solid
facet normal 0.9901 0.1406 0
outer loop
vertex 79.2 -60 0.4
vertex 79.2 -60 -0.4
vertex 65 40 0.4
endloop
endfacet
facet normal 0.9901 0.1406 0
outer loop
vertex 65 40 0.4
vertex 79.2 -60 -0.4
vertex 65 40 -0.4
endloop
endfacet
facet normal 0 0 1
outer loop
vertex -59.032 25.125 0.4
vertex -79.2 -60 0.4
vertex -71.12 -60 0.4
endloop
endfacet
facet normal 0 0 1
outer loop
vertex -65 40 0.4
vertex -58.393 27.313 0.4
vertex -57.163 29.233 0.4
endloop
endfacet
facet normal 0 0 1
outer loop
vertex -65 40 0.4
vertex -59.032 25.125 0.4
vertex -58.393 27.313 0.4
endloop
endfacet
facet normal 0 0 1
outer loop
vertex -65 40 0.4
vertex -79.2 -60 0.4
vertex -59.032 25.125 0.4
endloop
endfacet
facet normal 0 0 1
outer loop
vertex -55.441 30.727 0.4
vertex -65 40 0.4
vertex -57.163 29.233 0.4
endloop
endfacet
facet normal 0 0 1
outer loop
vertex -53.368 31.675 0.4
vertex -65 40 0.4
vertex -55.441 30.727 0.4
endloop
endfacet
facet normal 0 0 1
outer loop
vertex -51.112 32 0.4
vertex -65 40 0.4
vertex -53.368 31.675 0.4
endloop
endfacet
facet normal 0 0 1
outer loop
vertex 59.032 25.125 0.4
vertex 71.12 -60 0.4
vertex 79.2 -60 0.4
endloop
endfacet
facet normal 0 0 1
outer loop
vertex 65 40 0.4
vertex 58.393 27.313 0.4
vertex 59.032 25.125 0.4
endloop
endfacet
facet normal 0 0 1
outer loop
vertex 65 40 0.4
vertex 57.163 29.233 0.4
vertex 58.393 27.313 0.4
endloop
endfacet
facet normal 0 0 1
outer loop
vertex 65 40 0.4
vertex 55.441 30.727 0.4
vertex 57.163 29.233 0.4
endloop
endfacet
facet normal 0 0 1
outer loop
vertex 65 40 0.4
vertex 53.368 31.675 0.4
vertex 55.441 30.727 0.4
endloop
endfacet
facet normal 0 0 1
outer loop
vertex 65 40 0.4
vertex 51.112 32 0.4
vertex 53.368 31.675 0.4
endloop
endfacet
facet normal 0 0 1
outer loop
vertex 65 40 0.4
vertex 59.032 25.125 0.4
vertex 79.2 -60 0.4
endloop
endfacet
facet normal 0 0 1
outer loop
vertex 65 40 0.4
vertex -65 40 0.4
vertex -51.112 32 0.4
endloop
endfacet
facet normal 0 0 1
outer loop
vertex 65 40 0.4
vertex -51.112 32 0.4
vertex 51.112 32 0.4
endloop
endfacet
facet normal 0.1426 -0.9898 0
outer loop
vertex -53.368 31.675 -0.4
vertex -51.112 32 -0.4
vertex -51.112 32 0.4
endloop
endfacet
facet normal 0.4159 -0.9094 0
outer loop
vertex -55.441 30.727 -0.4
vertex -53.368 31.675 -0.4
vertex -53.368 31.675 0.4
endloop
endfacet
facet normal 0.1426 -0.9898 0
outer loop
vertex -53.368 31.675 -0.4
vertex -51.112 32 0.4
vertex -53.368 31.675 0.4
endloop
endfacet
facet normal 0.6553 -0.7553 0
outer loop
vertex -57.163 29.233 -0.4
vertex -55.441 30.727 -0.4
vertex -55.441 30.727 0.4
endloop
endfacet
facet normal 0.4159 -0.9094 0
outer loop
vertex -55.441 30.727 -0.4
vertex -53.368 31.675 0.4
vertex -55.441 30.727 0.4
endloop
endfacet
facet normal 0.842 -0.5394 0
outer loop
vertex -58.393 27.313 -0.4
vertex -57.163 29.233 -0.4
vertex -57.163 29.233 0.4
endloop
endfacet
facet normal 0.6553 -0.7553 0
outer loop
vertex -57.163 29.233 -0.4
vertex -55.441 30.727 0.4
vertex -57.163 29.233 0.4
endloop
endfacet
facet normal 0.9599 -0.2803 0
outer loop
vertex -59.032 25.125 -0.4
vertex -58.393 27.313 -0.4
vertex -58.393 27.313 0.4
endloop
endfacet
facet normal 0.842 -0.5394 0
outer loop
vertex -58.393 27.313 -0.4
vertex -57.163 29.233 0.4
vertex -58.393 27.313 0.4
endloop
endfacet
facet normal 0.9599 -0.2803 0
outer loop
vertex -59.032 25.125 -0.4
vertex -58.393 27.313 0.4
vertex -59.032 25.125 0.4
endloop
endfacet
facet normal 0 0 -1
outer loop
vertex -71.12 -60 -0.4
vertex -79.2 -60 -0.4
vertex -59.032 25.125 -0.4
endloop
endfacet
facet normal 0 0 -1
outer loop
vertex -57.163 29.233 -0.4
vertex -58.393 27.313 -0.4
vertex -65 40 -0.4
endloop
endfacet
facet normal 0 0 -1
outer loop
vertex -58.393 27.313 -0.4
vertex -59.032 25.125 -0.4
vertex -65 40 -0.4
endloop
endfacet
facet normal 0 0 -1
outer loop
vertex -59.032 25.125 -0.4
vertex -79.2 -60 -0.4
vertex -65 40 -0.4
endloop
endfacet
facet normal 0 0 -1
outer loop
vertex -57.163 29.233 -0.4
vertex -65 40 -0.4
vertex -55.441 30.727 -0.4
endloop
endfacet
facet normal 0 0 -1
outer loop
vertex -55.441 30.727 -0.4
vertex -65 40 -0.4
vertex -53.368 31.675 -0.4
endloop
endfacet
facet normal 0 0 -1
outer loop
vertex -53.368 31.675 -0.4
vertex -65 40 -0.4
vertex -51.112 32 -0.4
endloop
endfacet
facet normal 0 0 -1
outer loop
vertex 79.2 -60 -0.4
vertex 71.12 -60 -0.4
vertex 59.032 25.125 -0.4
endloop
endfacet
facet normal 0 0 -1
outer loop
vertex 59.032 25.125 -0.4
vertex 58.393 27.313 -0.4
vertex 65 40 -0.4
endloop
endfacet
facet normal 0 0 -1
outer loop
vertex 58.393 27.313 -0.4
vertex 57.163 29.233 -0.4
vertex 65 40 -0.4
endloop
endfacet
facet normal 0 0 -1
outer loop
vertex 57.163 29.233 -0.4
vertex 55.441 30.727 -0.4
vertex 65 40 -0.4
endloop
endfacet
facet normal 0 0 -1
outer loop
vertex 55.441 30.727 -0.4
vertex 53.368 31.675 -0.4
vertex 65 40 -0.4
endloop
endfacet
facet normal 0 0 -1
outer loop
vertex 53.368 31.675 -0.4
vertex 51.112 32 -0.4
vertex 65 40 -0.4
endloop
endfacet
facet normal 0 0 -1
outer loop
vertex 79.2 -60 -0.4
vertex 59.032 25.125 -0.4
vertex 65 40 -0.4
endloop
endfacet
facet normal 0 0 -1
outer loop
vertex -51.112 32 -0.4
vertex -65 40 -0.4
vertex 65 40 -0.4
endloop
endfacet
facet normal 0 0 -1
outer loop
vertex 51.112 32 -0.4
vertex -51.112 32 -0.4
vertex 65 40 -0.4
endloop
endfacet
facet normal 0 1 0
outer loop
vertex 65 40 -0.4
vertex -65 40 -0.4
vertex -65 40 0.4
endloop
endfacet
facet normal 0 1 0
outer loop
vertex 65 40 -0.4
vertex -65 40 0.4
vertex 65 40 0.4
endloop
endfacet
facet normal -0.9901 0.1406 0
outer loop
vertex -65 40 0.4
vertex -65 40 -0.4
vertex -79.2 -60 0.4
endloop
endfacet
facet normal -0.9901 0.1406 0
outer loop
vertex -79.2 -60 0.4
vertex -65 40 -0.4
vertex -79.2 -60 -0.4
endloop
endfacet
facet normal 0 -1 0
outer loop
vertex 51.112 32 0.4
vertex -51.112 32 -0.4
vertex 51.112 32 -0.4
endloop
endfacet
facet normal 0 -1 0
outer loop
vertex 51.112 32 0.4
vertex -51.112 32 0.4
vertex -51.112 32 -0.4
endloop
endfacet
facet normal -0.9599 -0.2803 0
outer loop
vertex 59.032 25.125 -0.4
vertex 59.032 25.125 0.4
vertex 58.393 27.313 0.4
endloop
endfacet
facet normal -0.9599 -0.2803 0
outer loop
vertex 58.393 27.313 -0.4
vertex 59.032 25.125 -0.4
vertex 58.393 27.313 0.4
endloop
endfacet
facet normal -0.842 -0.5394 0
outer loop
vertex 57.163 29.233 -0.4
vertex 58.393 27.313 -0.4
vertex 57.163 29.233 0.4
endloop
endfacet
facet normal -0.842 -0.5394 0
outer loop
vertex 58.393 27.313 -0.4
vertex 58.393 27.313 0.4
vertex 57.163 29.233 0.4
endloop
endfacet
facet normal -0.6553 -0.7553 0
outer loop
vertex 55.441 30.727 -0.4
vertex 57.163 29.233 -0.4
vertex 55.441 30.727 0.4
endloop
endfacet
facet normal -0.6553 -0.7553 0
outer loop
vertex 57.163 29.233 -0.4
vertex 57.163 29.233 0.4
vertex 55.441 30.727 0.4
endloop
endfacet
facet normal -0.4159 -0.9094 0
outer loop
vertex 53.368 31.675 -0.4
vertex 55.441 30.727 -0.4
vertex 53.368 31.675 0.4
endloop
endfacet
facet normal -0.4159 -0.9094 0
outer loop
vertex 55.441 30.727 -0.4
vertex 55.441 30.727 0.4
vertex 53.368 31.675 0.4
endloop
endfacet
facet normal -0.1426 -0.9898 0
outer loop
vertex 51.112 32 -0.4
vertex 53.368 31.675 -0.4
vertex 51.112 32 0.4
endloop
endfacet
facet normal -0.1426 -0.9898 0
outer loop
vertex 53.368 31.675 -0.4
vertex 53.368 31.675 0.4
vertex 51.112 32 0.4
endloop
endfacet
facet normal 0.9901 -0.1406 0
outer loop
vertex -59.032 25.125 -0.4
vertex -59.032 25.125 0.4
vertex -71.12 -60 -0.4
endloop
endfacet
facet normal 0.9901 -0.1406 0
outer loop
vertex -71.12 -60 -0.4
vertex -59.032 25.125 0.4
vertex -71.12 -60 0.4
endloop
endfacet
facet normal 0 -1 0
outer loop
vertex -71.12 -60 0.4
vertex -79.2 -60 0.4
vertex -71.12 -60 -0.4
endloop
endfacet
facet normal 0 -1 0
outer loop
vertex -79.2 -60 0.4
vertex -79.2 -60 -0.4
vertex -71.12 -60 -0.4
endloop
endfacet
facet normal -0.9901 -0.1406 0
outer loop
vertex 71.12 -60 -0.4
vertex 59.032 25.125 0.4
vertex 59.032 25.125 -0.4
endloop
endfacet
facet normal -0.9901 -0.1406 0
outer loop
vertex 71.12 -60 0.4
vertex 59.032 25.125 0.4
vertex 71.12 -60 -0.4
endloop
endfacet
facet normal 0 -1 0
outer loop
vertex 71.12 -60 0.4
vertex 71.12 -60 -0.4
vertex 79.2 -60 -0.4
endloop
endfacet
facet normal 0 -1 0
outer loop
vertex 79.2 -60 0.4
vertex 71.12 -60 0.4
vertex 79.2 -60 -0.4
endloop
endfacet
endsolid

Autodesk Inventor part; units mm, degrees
ref_plane "YZ Plane" through (0, 0, 0) normal (1, 0, 0) x (0, 1, 0)
ref_plane "XZ Plane" through (0, 0, 0) normal (0, 1, 0) x (-1, 0, 0)
ref_plane "XY Plane" through (0, 0, 0) normal (0, 0, 1) x (1, 0, 0)
sketch "Sketch1" plane through (0, 0, 0) normal (0, 0, 1) x (1, 0, 0)
  line L0 (0, 60) -> (0, -80) construction
  line L1 (-110.88, 0) -> (110.88, 0) construction
  line L2 (-79.2, -60) -> (79.2, -60)
  line L3 (79.2, -60) -> (65, 40)
  line L4 (-65, 40) -> (65, 40)
  line L5 (-65, 40) -> (-79.2, -60)
  point P0 (0, 0)
  dimension "d0" = 158.4
  dimension "d9" = 130
  dimension "d10" = 60
  dimension "d11" = 100
extrude "Extrusion1" add sketch "Sketch1" along normal mid plane 0.8
sketch "Esquisse2" plane through (0, 0, 0.4) normal (0, 0, 1) x (1, 0, 0)
  line L0 (-79.2, -60) -> (79.2, -60) construction
  line L1 (79.2, -60) -> (65, 40) construction
  line L2 (65, 40) -> (-65, 40) construction
  line L3 (-65, 40) -> (-79.2, -60) construction
  line L4 (0, 60) -> (0, -80) construction
  line L5 (-110.88, 0) -> (110.88, 0) construction
  line L6 (-51.1115, 32) -> (51.1115, 32)
  line L7 (-59.032, 25.1247) -> (-71.1197, -60)
  line L8 (59.032, 25.1247) -> (71.1197, -60)
  arc A0 (-51.1115, 32) -> (-59.032, 25.1247) centre (-51.1115, 24) ccw
  arc A1 (59.032, 25.1247) -> (51.1115, 32) centre (51.1115, 24) ccw
  line L9 (-71.1197, -60) -> (71.1197, -60)
  point P0 (0, 0)
  dimension "d12" = 8
  dimension "d15" = 8
  dimension "d16" = 8
extrude "Extrusion2" cut sketch "Esquisse2" against normal through all
properties part number "Cabine_Vitre_Avant_Haut" material "PVC-U"
